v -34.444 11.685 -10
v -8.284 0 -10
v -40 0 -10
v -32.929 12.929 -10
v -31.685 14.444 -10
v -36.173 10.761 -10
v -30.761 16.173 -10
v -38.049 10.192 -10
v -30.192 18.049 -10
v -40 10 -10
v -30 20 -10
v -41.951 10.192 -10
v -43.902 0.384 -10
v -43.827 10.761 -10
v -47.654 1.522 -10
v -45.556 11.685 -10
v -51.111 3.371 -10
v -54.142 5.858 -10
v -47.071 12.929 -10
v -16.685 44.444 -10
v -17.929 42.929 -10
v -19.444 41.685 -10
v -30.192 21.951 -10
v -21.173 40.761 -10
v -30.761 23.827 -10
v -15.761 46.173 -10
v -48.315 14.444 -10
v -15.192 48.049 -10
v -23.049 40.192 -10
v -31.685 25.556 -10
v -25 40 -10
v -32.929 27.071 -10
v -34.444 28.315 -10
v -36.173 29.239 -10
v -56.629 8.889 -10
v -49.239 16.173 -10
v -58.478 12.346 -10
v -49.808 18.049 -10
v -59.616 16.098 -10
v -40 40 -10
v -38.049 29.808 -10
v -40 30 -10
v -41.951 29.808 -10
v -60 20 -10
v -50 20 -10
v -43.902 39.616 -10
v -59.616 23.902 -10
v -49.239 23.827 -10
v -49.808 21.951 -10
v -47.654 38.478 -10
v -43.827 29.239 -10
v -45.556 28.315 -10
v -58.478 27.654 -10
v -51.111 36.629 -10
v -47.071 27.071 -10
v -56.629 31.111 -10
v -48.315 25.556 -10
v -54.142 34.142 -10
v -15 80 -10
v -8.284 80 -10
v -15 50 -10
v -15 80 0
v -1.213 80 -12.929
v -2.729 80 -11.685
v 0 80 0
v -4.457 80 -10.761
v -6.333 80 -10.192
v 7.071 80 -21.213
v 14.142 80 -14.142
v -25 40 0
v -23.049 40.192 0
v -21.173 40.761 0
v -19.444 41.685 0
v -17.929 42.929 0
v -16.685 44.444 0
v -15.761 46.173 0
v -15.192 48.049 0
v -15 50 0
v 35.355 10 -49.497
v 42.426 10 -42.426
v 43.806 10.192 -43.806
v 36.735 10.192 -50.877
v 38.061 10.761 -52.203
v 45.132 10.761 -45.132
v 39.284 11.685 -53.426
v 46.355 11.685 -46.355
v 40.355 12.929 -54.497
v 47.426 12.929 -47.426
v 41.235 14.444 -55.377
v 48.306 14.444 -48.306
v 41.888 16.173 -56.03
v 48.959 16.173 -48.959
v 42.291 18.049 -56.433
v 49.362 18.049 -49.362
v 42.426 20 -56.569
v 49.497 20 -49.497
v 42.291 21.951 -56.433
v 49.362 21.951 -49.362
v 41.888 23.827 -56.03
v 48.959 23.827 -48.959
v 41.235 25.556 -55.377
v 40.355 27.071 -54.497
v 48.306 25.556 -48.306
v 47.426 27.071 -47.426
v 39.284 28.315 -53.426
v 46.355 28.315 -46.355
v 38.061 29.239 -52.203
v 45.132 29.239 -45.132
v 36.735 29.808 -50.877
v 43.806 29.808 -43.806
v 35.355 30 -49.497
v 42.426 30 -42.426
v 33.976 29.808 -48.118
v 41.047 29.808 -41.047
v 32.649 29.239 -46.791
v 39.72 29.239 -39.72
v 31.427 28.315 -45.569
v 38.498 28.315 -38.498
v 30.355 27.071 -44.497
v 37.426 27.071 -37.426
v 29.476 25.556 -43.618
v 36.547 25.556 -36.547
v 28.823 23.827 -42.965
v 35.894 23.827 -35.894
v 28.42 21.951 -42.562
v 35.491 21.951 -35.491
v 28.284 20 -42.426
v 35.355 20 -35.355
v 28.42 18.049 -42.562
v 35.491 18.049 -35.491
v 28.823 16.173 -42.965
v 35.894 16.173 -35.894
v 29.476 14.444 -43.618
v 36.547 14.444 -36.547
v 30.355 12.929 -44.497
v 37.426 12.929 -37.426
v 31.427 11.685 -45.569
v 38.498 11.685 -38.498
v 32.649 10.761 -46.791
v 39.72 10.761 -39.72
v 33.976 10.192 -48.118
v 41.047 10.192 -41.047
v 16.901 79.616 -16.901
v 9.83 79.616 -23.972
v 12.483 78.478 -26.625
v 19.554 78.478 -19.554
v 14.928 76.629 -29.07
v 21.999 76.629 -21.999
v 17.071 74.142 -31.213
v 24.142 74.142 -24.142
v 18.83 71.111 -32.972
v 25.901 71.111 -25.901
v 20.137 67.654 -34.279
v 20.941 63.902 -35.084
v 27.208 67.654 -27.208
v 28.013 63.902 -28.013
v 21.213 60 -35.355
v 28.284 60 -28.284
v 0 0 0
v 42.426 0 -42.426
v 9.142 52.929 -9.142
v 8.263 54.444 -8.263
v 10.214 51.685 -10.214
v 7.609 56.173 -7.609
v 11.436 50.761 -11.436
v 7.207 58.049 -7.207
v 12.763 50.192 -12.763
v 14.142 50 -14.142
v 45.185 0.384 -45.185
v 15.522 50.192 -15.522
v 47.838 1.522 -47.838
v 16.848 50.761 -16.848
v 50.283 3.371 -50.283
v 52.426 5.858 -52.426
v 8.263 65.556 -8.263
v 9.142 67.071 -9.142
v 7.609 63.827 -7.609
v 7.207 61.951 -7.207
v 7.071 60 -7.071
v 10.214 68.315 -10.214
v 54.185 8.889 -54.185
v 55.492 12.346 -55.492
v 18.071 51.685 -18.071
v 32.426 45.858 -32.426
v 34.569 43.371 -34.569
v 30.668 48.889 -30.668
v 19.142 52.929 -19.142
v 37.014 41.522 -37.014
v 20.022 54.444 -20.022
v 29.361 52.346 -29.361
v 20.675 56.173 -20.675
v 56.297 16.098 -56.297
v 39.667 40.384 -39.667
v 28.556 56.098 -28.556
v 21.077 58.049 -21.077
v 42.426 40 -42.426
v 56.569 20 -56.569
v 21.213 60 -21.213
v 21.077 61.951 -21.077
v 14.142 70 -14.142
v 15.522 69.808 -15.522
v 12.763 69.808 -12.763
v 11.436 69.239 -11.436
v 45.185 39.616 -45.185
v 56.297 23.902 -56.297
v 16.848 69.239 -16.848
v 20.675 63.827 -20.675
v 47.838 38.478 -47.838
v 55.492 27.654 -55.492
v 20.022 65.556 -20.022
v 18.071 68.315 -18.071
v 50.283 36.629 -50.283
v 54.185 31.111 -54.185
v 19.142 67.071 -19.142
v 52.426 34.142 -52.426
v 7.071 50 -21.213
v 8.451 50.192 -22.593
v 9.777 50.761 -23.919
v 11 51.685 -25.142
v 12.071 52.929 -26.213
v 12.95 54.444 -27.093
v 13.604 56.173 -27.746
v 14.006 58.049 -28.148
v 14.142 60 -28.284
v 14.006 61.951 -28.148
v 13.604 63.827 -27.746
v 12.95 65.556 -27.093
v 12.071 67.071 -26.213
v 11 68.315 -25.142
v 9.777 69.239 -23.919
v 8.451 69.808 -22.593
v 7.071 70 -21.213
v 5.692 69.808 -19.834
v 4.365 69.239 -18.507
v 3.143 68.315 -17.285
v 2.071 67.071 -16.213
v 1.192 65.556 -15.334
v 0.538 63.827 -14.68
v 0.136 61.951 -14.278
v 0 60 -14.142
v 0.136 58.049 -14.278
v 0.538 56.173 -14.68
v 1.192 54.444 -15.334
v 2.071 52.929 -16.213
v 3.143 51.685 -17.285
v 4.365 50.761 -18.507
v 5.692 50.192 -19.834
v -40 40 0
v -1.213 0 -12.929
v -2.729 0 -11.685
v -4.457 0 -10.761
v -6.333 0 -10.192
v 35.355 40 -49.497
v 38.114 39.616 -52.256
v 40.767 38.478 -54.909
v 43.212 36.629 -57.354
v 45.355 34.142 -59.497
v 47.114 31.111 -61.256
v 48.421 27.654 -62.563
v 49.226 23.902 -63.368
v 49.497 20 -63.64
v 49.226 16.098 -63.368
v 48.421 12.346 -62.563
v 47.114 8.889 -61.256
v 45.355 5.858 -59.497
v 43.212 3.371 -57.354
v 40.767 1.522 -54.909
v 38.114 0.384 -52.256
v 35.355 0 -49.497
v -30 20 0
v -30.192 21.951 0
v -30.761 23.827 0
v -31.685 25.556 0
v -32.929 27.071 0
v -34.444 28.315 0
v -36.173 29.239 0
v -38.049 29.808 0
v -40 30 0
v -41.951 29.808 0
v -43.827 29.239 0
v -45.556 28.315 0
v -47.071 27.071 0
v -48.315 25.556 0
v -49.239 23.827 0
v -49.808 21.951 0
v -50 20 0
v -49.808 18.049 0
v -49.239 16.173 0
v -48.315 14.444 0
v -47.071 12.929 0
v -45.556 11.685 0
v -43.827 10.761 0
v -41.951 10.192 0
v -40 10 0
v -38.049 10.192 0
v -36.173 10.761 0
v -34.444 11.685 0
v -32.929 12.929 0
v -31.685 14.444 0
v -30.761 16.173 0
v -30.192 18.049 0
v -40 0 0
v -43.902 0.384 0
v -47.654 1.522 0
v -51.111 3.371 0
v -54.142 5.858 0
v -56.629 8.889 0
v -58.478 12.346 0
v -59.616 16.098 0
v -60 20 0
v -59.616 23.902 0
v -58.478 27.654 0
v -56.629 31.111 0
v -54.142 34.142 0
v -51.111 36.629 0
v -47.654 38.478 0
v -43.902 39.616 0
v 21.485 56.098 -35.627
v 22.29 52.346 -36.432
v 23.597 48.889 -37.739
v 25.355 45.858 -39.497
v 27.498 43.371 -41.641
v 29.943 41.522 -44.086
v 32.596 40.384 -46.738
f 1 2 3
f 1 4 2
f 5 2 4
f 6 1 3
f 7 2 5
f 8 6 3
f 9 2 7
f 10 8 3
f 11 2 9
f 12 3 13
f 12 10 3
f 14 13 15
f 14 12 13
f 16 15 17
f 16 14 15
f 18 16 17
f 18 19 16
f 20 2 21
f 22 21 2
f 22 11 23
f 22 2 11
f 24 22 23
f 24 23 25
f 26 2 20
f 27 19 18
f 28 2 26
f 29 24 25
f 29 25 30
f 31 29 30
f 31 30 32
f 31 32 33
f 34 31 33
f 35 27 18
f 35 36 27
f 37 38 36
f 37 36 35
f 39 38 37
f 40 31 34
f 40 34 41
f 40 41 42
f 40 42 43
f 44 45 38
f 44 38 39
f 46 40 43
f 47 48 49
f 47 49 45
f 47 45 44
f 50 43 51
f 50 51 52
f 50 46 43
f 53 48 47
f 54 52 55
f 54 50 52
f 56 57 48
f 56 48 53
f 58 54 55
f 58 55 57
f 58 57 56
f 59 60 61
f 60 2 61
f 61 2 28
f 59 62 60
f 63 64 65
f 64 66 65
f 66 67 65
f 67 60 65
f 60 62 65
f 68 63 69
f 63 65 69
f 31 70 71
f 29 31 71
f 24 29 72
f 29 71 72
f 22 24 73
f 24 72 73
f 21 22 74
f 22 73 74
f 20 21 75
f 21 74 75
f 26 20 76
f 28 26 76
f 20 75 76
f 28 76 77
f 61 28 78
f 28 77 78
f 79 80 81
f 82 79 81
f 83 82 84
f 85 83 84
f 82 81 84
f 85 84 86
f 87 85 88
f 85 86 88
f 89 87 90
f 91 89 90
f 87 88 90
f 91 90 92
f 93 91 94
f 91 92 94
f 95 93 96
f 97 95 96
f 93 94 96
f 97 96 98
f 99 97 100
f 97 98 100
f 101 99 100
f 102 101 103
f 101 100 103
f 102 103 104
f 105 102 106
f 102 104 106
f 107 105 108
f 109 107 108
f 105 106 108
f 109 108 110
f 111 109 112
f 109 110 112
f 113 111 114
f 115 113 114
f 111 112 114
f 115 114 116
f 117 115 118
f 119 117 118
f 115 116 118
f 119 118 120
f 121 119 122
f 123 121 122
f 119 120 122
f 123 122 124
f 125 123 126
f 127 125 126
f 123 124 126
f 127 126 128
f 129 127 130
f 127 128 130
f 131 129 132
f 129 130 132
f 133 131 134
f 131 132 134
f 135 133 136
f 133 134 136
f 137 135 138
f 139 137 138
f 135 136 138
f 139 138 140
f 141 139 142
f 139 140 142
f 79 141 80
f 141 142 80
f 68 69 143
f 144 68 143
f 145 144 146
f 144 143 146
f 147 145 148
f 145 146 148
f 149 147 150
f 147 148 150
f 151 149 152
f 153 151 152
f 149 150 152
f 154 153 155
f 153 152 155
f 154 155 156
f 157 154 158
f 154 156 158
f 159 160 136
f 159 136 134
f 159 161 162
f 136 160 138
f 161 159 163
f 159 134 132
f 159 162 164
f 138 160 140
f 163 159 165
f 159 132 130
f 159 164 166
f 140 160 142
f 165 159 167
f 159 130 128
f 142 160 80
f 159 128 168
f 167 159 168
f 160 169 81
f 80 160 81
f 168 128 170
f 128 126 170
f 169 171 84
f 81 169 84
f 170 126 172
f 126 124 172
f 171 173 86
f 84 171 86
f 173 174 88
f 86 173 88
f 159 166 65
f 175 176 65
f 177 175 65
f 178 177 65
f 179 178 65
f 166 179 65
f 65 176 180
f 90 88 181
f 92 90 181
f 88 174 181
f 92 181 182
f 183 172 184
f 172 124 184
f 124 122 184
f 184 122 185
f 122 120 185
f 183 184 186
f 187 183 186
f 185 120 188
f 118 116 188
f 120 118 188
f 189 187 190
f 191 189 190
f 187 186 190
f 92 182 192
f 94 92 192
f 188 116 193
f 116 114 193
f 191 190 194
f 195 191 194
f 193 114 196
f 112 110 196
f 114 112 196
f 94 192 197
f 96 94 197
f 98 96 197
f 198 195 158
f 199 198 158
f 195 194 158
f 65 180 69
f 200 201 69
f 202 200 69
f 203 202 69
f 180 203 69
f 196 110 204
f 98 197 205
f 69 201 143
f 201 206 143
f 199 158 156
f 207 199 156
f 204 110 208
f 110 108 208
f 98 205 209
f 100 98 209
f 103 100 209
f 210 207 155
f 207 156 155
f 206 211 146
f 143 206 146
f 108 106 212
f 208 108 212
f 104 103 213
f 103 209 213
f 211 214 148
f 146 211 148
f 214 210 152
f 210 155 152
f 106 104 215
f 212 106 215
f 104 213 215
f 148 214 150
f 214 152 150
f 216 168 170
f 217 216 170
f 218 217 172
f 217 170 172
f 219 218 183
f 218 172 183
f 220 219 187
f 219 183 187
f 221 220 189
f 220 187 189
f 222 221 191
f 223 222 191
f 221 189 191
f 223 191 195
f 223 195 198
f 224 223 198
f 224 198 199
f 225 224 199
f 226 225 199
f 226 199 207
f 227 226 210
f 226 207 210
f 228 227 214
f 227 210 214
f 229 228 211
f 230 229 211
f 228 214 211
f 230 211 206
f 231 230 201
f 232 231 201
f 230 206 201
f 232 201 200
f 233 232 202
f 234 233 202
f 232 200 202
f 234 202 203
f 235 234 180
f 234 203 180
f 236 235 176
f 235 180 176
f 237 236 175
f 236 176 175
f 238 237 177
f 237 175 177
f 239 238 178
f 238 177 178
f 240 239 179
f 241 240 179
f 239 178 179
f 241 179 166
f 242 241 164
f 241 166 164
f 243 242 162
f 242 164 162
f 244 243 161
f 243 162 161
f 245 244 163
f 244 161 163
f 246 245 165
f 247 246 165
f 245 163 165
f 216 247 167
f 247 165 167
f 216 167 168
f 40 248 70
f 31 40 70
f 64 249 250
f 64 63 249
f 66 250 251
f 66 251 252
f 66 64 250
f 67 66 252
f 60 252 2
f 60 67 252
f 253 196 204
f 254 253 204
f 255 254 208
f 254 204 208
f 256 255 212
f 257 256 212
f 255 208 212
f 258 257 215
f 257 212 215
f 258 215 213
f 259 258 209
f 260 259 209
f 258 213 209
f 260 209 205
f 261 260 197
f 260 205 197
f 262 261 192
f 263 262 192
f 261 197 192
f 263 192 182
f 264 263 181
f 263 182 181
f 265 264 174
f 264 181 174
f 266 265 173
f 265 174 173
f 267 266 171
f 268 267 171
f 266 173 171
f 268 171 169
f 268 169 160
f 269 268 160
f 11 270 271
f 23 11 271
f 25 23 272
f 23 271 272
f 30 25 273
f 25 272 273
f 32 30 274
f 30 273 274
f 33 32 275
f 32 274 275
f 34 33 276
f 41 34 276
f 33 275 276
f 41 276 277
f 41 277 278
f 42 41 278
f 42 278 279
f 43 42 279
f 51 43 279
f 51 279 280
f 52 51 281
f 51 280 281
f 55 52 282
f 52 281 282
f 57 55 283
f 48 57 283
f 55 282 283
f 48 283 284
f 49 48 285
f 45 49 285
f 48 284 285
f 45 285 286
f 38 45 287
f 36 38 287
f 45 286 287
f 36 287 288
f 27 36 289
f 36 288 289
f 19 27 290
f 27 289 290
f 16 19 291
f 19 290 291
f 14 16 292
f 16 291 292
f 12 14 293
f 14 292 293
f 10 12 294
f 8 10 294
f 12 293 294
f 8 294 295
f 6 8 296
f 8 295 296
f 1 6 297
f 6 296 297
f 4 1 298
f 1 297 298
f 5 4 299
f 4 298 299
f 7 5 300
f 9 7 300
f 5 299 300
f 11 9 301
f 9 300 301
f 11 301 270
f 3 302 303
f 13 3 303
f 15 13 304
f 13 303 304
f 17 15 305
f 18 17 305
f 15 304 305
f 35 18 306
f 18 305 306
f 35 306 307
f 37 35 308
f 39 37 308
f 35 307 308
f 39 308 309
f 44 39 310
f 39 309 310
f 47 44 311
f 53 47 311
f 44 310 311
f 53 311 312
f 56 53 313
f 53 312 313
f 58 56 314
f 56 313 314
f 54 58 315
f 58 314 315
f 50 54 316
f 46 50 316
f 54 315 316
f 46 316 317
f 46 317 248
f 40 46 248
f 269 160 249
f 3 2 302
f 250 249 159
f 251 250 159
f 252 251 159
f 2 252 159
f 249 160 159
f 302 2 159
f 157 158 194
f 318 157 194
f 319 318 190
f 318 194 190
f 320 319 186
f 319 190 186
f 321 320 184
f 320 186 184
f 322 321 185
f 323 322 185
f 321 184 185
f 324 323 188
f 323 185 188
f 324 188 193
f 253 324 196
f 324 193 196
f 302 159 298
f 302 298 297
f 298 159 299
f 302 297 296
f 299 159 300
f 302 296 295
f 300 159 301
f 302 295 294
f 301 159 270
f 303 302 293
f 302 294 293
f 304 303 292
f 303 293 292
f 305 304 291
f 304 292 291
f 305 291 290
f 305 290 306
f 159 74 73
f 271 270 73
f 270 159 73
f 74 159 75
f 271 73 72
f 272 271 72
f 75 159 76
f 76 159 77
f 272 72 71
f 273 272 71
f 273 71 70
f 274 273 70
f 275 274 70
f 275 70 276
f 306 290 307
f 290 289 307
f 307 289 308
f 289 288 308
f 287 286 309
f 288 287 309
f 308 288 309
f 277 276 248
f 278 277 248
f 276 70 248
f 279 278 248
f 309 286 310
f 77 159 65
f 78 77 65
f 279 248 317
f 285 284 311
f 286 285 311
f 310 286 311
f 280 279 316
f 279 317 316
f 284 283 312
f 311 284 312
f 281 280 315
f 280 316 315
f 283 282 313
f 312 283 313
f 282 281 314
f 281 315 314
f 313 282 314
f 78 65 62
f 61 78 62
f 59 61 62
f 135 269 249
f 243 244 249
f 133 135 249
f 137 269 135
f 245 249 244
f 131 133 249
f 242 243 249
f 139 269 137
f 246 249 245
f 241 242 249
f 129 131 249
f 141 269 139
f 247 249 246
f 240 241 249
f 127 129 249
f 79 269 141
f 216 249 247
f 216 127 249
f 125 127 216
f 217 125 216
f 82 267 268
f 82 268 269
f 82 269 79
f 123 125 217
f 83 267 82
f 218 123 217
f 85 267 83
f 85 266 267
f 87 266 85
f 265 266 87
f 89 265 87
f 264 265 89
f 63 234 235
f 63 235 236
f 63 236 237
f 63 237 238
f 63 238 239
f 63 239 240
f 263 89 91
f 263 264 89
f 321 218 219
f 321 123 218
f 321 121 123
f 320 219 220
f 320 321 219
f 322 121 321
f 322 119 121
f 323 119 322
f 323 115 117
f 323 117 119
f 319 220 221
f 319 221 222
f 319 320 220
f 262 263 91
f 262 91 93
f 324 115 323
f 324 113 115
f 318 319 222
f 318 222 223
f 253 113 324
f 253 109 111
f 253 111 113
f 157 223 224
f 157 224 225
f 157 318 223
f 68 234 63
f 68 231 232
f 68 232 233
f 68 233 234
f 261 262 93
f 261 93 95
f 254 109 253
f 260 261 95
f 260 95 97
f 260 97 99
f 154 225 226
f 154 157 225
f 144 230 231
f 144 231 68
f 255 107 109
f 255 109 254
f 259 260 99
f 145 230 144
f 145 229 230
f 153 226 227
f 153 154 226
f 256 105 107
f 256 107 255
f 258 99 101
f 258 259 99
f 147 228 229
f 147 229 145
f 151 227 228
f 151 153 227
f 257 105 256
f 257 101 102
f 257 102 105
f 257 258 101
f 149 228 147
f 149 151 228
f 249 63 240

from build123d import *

# Parameters (mm, degrees)
SKETCH_1_R      = 10
EXTRUDE_1_DEPTH = 10
SKETCH_2_R      = 10
EXTRUDE_2_DEPTH = 10
FILLET_1_R      = 10


with BuildPart() as part:
    # 草圖1 → 填料-伸長1 (new body)
    with BuildSketch(Plane.XY):
        with BuildLine():
            Line((0, 80), (0, 0))
            Line((0, 0), (-40, 0))
            ThreePointArc((-40, 0), (-60, 20), (-40, 40))
            Line((-40, 40), (-25, 40))
            ThreePointArc((-25, 40), (-17.928932188, 42.928932188), (-15, 50))
            Line((-15, 50), (-15, 80))
            Line((-15, 80), (0, 80))
        make_face()
        with Locations((-40, 20)):
            Circle(SKETCH_1_R, mode=Mode.SUBTRACT)
    extrude(amount=-EXTRUDE_1_DEPTH)

    # 草圖2 → 填料-伸長2 (add)
    with BuildSketch(Plane(origin=(0, 0, 0), x_dir=(0, -1, 0), z_dir=(0.707106781, 0, 0.707106781))):
        with BuildLine():
            Line((0, 60), (0, 0))
            Line((0, 0), (-80, 0))
            Line((-80, 0), (-80, 20))
            ThreePointArc((-80, 20), (-74.142135624, 34.142135624), (-60, 40))
            ThreePointArc((-60, 40), (-45.857864376, 45.857864376), (-40, 60))
            ThreePointArc((-40, 60), (-20, 80), (0, 60))
        make_face()
        with Locations((-60, 20)):
            Circle(SKETCH_2_R, mode=Mode.SUBTRACT)
        with Locations((-20, 60)):
            Circle(SKETCH_2_R, mode=Mode.SUBTRACT)
    extrude(amount=-EXTRUDE_2_DEPTH)

    # 圓角1
    fillet_1_edges = [part.edges().sort_by_distance(p)[0] for p in [
        (-4.142135624, 40, -10),
    ]]
    fillet(fillet_1_edges, radius=FILLET_1_R)


solid = part.part
